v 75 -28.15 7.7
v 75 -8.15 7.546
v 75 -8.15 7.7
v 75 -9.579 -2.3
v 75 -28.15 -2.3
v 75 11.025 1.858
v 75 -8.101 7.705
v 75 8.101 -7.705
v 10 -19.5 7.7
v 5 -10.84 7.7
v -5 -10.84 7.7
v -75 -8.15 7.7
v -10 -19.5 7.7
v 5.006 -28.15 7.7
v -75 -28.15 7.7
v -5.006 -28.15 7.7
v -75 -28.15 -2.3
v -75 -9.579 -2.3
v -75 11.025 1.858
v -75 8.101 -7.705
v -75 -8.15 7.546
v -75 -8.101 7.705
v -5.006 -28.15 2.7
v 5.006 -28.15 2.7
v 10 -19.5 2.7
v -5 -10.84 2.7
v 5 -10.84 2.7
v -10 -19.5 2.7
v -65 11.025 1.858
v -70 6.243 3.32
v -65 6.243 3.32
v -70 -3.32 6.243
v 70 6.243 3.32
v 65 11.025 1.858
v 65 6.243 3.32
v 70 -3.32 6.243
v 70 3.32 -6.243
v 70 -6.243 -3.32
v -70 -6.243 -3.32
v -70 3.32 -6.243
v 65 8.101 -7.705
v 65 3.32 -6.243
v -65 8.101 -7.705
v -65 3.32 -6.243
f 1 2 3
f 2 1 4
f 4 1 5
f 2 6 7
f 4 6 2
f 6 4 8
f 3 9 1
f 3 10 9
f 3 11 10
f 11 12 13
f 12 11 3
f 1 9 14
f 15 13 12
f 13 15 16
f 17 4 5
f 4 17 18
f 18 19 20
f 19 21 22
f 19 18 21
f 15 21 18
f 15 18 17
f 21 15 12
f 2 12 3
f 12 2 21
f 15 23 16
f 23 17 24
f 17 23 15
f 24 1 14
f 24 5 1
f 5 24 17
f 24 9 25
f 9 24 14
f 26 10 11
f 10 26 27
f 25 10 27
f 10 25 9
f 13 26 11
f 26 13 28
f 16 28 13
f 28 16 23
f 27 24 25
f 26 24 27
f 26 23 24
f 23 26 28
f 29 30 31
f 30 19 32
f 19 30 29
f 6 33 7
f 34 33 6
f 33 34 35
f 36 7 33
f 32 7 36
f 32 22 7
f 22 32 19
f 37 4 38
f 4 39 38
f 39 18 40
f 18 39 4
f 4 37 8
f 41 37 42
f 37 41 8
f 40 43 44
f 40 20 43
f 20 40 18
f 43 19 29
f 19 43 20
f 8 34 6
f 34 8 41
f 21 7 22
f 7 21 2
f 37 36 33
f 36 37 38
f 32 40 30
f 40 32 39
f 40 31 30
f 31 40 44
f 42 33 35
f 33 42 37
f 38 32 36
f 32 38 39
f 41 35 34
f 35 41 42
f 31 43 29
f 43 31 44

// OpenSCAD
//cube(100,0,0);

/*rotate([0,0,15])
    cube(20);*/
    
width = 150;
depth = 10;
height = 10;
    
/*translate([-width/2, 0, 0])
sphere(r = depth);*/

difference() {
    translate([0, (-depth*2)+1.85, 2.7])
        cube([width,depth*2,height],center=true);

    translate([0, (-depth*2)+0.5, 2.7])
        cylinder(10,10,10, $fn=6);
}
    
// Pinza
rotate([-17,0,0])
difference() {
    cube([width,depth*2,height],center=true);

    cube([width-(depth),depth,height*2],center=true);

    translate([0, depth-1, 0])
        cube([width-(depth*2),depth,height*3],center=true);
}
